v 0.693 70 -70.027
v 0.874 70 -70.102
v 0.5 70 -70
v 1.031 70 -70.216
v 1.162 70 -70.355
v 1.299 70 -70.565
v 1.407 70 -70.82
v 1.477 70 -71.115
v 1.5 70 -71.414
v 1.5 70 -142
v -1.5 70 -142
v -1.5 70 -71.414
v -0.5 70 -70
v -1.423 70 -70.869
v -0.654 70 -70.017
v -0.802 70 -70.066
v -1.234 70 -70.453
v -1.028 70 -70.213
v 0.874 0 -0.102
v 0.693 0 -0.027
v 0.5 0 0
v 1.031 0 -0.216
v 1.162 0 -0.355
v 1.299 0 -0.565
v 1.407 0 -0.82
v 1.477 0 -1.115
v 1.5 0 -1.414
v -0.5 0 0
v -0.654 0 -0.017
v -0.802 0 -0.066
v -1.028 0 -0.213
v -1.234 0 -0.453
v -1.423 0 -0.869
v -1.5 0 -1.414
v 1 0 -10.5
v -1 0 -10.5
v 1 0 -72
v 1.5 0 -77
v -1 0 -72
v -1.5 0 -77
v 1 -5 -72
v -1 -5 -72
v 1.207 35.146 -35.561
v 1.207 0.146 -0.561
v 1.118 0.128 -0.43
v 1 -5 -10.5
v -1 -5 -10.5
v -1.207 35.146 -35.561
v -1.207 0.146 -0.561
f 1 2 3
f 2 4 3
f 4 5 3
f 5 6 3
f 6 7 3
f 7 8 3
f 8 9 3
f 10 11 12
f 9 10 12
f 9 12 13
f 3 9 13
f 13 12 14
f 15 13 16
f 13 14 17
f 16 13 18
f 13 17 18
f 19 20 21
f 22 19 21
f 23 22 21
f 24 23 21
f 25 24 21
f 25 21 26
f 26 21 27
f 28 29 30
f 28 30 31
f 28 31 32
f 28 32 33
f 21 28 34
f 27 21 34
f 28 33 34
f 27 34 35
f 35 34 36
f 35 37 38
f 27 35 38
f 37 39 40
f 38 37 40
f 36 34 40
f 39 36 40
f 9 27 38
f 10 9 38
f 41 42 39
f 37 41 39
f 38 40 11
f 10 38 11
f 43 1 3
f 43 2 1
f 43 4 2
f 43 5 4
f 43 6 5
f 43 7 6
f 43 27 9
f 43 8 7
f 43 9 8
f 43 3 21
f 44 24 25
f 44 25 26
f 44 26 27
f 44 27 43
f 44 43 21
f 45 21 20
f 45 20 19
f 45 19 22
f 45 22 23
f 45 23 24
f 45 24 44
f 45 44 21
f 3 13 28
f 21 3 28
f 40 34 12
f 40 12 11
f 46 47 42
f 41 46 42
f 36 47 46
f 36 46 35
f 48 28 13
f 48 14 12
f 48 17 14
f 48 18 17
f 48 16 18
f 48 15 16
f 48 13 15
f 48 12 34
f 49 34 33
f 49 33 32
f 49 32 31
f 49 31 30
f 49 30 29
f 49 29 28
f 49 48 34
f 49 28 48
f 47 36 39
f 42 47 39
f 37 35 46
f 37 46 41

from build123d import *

# Parameters (mm, degrees)
EXTRUDE_1_DEPTH      = 1.5
EXTRUDE_1_DEPTH_BACK = 1.5
EXTRUDE_2_DEPTH      = 1
EXTRUDE_2_DEPTH_BACK = 1
SKETCH_1_3_W         = 61.5
SKETCH_1_3_H         = 5
FILLET_1_R           = 1


with BuildPart() as part:
    # Эскиз1 → Бобышка-Вытянуть1 (new, two sides: drawn at the far end of the back side and taken through both)
    with BuildSketch(Plane(origin=(0, 0, 0), x_dir=(0, 0, -1), z_dir=(1, 0, 0)).offset(-EXTRUDE_1_DEPTH_BACK)):
        Polygon((70, 70), (0, 0), (10.5, 0), (72, 0), (77, 0), (142, 70), align=None)
    extrude(amount=EXTRUDE_1_DEPTH + EXTRUDE_1_DEPTH_BACK)

    # Эскиз1<3> → Бобышка-Вытянуть2 (add, two sides: drawn at the far end of the back side and taken through both)
    with BuildSketch(Plane(origin=(0, 0, 0), x_dir=(0, 0, -1), z_dir=(1, 0, 0)).offset(-EXTRUDE_2_DEPTH_BACK)):
        with Locations((41.25, -2.5)):
            Rectangle(SKETCH_1_3_W, SKETCH_1_3_H)
    extrude(amount=EXTRUDE_2_DEPTH + EXTRUDE_2_DEPTH_BACK)

    # Скругление1
    fillet_1_edges = [part.edges().sort_by_distance(p)[0] for p in [
        (-1.5, 35, -35),
        (1.5, 35, -35),
    ]]
    fillet(fillet_1_edges, radius=FILLET_1_R)


solid = part.part
